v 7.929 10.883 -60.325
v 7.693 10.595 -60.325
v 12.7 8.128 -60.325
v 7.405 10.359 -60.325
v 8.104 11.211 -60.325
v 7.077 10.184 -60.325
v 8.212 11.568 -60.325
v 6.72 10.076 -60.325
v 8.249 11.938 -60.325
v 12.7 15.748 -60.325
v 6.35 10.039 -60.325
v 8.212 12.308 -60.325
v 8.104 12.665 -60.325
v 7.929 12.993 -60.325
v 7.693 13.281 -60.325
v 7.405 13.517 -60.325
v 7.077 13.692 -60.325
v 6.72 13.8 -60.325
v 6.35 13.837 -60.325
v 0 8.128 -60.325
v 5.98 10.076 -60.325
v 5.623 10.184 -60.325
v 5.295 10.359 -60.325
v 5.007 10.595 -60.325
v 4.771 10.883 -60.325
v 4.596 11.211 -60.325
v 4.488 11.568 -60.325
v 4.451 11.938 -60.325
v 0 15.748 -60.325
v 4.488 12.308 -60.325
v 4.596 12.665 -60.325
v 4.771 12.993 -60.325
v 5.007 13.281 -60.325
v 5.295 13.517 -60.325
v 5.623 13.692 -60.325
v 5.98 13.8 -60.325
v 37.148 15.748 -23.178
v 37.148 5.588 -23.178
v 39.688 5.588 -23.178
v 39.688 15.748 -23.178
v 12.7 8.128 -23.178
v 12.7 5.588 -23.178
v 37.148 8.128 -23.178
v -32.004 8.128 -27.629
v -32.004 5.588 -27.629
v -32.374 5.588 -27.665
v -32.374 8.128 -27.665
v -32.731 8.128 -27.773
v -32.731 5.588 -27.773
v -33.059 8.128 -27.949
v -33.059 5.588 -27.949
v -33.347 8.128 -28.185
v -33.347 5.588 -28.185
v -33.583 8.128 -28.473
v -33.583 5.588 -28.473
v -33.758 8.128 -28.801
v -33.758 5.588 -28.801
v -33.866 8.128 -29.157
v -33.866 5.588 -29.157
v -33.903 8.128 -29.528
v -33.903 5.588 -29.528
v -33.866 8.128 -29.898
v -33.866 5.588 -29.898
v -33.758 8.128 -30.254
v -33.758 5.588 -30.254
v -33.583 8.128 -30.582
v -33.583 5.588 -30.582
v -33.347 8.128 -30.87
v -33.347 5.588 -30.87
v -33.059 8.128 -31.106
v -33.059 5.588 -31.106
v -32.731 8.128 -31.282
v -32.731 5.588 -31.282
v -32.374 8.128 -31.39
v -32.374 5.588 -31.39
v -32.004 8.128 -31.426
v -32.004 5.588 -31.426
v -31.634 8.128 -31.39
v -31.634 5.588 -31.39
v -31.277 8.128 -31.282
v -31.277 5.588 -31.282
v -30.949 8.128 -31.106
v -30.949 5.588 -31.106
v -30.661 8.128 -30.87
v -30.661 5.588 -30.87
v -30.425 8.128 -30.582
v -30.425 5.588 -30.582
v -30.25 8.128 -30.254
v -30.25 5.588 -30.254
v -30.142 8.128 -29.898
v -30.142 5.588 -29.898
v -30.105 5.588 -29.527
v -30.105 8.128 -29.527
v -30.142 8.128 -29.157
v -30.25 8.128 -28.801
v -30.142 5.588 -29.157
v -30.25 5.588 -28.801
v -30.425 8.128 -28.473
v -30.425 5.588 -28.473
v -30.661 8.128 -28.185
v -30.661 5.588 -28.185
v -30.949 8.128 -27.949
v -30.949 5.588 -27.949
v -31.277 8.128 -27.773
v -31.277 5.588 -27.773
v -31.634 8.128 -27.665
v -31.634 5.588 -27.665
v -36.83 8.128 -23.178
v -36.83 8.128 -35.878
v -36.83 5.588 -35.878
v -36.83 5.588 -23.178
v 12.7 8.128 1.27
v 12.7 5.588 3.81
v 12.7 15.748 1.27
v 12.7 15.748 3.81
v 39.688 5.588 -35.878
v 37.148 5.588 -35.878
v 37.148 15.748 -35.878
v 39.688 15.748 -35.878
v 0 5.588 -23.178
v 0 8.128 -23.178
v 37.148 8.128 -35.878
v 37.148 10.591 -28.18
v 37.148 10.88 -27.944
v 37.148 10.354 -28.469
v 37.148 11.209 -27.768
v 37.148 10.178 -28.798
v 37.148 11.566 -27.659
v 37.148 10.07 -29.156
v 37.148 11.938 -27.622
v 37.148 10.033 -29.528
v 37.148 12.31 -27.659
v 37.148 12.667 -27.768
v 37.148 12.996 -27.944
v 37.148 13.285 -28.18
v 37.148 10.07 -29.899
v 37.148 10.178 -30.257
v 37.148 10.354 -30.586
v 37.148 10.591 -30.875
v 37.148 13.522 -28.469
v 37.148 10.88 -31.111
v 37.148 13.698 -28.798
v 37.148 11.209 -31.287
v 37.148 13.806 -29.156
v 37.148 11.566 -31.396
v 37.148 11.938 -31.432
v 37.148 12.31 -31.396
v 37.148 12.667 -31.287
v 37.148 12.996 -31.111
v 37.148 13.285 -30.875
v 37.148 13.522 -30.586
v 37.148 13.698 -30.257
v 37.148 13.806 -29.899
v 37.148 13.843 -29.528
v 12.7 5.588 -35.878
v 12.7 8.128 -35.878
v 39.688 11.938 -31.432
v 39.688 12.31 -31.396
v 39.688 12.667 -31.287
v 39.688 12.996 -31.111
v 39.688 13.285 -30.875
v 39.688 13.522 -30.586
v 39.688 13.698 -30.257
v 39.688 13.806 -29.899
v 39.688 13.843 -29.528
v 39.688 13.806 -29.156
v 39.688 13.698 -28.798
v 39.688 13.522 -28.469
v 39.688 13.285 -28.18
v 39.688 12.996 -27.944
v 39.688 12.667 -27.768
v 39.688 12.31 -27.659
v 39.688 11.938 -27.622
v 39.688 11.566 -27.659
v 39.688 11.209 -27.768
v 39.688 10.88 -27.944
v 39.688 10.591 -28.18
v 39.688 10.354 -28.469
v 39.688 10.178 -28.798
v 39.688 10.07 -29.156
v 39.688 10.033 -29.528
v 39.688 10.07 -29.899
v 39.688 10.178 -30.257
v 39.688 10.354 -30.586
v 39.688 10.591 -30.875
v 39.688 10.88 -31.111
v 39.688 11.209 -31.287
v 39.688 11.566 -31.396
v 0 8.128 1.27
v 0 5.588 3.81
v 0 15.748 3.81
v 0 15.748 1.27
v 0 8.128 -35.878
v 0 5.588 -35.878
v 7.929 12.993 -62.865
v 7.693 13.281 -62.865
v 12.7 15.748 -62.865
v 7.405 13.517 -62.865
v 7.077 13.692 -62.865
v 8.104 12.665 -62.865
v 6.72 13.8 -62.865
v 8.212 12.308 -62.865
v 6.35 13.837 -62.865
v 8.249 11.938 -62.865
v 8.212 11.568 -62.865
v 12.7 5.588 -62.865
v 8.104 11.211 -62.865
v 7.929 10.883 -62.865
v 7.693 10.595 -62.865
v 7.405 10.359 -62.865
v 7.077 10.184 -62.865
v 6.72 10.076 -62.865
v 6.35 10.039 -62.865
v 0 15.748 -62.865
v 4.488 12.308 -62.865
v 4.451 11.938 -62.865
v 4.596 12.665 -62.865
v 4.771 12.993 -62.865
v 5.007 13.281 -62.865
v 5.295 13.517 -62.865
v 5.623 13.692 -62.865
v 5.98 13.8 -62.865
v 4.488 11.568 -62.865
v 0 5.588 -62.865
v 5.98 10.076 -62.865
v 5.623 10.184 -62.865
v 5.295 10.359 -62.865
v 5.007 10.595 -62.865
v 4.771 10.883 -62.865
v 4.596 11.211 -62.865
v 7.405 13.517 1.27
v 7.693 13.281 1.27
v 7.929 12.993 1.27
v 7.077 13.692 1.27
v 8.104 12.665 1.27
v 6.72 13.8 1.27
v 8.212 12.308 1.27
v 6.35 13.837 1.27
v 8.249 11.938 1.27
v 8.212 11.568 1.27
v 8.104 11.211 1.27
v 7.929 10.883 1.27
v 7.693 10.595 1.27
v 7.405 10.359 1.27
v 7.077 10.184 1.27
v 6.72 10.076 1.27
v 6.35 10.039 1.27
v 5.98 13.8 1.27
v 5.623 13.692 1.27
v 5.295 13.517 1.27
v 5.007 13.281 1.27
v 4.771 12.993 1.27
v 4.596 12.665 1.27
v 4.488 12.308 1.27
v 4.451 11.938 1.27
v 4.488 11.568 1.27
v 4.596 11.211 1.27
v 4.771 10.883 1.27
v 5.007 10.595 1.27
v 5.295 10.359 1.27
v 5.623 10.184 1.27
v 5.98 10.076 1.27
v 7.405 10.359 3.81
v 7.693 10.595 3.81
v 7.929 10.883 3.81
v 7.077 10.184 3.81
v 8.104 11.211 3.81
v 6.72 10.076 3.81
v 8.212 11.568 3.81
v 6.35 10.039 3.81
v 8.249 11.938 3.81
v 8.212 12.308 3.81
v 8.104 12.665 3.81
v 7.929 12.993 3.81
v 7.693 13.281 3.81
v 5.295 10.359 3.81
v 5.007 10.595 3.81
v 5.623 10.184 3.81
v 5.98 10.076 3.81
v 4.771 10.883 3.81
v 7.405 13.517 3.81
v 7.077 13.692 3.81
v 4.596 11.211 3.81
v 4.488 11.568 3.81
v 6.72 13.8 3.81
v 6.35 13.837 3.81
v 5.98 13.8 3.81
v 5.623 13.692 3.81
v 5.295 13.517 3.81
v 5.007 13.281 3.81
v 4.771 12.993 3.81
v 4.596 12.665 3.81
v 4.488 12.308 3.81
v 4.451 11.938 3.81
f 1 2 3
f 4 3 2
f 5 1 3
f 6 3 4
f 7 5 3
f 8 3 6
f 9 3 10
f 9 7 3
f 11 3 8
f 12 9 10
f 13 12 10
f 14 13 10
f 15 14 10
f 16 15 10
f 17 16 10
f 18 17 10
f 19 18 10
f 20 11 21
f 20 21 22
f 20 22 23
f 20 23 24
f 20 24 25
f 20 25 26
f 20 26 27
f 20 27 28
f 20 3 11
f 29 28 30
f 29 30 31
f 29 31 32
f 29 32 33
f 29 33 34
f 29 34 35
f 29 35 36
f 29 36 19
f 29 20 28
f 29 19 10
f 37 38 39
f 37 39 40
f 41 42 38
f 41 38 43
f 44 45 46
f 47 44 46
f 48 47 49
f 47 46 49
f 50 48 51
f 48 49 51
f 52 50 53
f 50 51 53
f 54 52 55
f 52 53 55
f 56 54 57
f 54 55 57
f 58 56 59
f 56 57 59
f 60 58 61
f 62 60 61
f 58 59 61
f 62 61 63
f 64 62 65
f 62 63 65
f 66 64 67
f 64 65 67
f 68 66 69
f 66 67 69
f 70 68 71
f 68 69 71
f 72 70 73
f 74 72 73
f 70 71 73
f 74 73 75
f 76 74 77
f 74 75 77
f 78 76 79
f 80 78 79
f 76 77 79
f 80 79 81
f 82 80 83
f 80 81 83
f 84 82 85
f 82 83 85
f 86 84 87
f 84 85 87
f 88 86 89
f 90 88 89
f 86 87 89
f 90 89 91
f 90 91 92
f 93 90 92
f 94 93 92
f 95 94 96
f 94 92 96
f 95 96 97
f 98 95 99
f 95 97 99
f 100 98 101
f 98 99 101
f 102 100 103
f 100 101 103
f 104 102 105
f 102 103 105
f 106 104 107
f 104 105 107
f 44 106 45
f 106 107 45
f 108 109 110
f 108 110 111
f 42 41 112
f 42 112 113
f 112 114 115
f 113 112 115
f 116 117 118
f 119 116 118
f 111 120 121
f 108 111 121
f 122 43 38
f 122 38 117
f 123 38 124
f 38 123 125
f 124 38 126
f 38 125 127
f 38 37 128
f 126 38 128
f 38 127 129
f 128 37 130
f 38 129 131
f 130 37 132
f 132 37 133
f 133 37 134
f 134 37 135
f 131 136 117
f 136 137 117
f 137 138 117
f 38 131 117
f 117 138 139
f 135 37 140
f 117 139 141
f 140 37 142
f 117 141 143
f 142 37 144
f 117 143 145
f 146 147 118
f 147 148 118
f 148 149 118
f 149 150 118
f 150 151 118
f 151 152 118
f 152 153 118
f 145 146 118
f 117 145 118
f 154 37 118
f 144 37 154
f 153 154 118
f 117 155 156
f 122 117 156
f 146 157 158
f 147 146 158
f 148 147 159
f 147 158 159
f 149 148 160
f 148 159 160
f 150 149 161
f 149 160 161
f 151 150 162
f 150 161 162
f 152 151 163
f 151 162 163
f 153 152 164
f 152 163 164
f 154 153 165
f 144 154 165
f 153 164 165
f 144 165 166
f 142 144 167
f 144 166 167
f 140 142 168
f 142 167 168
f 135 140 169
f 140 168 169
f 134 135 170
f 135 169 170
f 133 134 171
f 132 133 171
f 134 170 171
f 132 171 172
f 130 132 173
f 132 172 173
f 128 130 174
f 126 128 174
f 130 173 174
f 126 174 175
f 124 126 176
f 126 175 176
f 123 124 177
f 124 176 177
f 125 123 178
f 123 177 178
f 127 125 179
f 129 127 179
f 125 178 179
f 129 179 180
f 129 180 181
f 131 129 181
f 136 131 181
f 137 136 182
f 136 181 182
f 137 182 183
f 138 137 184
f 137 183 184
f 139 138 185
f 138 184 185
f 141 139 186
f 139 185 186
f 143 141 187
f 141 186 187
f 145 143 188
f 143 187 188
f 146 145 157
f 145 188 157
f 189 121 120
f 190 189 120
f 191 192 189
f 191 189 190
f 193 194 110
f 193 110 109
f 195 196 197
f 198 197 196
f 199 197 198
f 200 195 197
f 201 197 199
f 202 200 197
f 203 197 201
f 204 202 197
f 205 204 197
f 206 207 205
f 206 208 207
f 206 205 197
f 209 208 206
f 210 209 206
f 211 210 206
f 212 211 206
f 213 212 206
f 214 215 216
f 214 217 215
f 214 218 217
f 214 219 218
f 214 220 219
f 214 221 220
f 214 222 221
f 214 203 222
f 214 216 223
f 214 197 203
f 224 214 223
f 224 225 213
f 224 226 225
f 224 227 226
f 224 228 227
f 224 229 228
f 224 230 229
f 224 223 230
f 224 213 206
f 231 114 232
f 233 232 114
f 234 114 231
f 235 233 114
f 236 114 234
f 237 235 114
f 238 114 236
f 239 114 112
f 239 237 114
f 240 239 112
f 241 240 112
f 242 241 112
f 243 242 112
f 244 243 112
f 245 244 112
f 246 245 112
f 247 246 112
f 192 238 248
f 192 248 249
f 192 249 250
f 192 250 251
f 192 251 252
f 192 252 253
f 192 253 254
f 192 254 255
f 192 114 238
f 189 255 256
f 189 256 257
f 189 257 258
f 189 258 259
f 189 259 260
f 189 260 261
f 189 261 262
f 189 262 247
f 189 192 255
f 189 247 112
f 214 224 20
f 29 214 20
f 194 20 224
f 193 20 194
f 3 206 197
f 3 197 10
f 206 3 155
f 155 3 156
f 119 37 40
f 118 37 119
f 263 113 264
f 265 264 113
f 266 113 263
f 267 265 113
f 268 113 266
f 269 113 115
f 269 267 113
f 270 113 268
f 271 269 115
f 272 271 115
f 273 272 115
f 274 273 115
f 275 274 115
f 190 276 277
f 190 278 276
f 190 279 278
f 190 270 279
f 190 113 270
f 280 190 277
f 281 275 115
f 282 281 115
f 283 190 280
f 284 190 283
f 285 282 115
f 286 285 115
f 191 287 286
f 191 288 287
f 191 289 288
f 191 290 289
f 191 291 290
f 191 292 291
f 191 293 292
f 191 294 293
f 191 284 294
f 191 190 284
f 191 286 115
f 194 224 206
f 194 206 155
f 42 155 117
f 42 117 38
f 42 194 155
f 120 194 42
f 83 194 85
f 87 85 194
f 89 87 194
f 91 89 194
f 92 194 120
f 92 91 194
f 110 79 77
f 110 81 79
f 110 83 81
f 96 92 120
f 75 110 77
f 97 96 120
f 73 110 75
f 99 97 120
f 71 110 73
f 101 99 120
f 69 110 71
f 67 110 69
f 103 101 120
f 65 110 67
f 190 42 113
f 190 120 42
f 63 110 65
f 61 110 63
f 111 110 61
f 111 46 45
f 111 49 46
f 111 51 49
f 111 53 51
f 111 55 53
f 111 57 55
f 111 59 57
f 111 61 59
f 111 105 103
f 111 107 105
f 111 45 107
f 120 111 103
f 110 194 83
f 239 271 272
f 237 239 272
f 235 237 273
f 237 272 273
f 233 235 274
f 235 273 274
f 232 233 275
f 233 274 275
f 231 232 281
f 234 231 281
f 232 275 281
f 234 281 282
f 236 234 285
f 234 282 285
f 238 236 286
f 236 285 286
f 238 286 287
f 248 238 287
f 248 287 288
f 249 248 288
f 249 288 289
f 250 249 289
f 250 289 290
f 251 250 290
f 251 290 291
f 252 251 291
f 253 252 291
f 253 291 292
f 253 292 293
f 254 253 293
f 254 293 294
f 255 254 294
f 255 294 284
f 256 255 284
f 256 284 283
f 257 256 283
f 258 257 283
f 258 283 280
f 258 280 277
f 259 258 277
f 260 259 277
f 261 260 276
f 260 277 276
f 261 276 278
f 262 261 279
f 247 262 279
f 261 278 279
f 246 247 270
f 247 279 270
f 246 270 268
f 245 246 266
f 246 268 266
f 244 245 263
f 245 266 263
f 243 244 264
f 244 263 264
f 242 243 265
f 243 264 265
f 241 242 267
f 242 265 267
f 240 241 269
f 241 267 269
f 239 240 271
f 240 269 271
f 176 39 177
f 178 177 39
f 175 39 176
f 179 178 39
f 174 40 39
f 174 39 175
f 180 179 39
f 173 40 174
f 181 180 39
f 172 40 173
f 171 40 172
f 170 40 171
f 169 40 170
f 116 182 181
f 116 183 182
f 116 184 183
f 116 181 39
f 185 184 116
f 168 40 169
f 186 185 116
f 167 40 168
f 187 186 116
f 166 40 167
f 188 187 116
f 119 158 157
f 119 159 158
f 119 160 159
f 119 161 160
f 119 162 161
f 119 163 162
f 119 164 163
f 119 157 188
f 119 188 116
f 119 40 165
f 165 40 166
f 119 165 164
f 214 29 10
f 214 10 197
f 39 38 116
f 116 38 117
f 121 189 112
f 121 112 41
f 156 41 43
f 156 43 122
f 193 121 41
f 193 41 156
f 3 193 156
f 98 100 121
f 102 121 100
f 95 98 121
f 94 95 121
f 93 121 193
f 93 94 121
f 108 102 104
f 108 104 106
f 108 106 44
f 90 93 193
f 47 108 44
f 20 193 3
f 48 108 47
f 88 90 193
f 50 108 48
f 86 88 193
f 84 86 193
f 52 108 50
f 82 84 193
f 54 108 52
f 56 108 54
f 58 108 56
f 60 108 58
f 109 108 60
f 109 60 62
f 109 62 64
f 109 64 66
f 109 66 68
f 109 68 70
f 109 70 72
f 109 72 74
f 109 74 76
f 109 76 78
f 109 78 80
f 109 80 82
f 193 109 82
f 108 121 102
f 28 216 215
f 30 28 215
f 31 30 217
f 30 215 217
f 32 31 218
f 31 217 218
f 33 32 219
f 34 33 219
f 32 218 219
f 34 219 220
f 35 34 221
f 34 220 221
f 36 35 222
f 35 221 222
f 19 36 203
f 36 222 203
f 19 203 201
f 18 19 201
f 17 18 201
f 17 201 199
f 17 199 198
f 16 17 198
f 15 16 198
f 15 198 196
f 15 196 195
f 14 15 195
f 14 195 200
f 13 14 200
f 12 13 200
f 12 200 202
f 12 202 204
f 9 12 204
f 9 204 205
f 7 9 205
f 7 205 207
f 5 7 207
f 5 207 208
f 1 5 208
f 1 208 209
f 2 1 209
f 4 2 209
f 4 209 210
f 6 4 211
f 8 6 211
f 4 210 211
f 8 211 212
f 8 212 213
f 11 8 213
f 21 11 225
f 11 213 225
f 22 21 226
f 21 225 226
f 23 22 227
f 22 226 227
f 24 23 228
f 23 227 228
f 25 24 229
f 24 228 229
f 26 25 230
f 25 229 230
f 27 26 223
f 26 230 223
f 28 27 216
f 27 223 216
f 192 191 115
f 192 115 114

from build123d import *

# Parameters (mm, degrees)
EXTRUDE_THIN1_DEPTH       = 12.7
F_6_CLEARANCE_HOLE1_D     = 3.7973
F_6_CLEARANCE_HOLE1_DEPTH = 7.62
F_6_CLEARANCE_HOLE1_TIP   = 1.140824014
F_6_CLEARANCE_HOLE2_D     = 3.7973
F_6_CLEARANCE_HOLE2_DEPTH = 7.62
F_6_CLEARANCE_HOLE2_TIP   = 1.140824014
SKETCH6_W                 = 12.7
SKETCH6_H                 = 2.54
BOSS_EXTRUDE1_DEPTH       = 24.4475
SKETCH7_W                 = 12.7
SKETCH7_H                 = 10.16
BOSS_EXTRUDE2_DEPTH       = 2.54
SKETCH9_R                 = 1.905
CUT_EXTRUDE1_DEPTH        = 2.54
SKETCH10_W                = 12.7
SKETCH10_H                = 2.54
BOSS_EXTRUDE3_DEPTH       = 36.83
SKETCH12_W                = 1.89865
SKETCH12_H                = 2.54105


with BuildPart() as part:
    # Sketch1 → Extrude-Thin1 (new body)
    with BuildSketch(Plane(origin=(0, 0, 0), x_dir=(0, 0, -1), z_dir=(1, 0, 0))):
        Polygon((-1.27, 15.748), (-1.27, 8.128), (60.325, 8.128), (60.325, 15.748), (62.865, 15.748), (62.865, 5.588), (-3.81, 5.588), (-3.81, 15.748), align=None)
    extrude(amount=EXTRUDE_THIN1_DEPTH)

    # #6 Clearance Hole1
    with Locations(Plane(origin=(0, 0, 1.27), x_dir=(-1, 0, 0), z_dir=(0, 0, -1))):
        with Locations((-6.35, 11.938)):
            Hole(F_6_CLEARANCE_HOLE1_D / 2, depth=F_6_CLEARANCE_HOLE1_DEPTH)
            with Locations((0, 0, -(F_6_CLEARANCE_HOLE1_DEPTH + F_6_CLEARANCE_HOLE1_TIP / 2))):  # 118° drill point
                Cone(0, F_6_CLEARANCE_HOLE1_D / 2, F_6_CLEARANCE_HOLE1_TIP, mode=Mode.SUBTRACT)

    # #6 Clearance Hole2
    with Locations(Plane.XY.offset(-60.325)):
        with Locations((6.35, 11.938)):
            Hole(F_6_CLEARANCE_HOLE2_D / 2, depth=F_6_CLEARANCE_HOLE2_DEPTH)
            with Locations((0, 0, -(F_6_CLEARANCE_HOLE2_DEPTH + F_6_CLEARANCE_HOLE2_TIP / 2))):  # 118° drill point
                Cone(0, F_6_CLEARANCE_HOLE2_D / 2, F_6_CLEARANCE_HOLE2_TIP, mode=Mode.SUBTRACT)

    # Sketch6 → Boss-Extrude1 (add)
    with BuildSketch(Plane(origin=(12.7, 0, 0), x_dir=(0, 0, -1), z_dir=(1, 0, 0))):
        with Locations((29.5275, 6.858)):
            Rectangle(SKETCH6_W, SKETCH6_H)
    extrude(amount=BOSS_EXTRUDE1_DEPTH)

    # Sketch10 → Boss-Extrude3 (add)
    with BuildSketch(Plane.ZY):
        with Locations((-29.5275, 6.858)):
            Rectangle(SKETCH10_W, SKETCH10_H)
    extrude(amount=BOSS_EXTRUDE3_DEPTH)

    # Sketch12 → #6 Clearance Hole3 (revolve, cut)
    with BuildSketch(Plane(origin=(-32.004, 8.128, -29.5275), x_dir=(0, 0, 1), z_dir=(1, 0, 0))):
        with Locations((0.949325, 1.270525)):
            Rectangle(SKETCH12_W, SKETCH12_H)
    revolve(axis=Axis((-32.004, 14.478, -29.5275), (0, -1, 0)), mode=Mode.SUBTRACT)


with BuildPart() as body_2:
    # Sketch7 → Boss-Extrude2 (new body)
    with BuildSketch(Plane(origin=(37.1475, 0, 0), x_dir=(0, 0, -1), z_dir=(1, 0, 0))):
        with Locations((29.5275, 10.668)):
            Rectangle(SKETCH7_W, SKETCH7_H)
    extrude(amount=BOSS_EXTRUDE2_DEPTH)

    # Sketch9 → Cut-Extrude1 (cut)
    with BuildSketch(Plane(origin=(39.6875, 0, 0), x_dir=(0, 0, -1), z_dir=(1, 0, 0))):
        with Locations((29.5275, 11.938)):
            Circle(SKETCH9_R)
    extrude(amount=-CUT_EXTRUDE1_DEPTH, mode=Mode.SUBTRACT)


solid = Compound([part.part, body_2.part])
